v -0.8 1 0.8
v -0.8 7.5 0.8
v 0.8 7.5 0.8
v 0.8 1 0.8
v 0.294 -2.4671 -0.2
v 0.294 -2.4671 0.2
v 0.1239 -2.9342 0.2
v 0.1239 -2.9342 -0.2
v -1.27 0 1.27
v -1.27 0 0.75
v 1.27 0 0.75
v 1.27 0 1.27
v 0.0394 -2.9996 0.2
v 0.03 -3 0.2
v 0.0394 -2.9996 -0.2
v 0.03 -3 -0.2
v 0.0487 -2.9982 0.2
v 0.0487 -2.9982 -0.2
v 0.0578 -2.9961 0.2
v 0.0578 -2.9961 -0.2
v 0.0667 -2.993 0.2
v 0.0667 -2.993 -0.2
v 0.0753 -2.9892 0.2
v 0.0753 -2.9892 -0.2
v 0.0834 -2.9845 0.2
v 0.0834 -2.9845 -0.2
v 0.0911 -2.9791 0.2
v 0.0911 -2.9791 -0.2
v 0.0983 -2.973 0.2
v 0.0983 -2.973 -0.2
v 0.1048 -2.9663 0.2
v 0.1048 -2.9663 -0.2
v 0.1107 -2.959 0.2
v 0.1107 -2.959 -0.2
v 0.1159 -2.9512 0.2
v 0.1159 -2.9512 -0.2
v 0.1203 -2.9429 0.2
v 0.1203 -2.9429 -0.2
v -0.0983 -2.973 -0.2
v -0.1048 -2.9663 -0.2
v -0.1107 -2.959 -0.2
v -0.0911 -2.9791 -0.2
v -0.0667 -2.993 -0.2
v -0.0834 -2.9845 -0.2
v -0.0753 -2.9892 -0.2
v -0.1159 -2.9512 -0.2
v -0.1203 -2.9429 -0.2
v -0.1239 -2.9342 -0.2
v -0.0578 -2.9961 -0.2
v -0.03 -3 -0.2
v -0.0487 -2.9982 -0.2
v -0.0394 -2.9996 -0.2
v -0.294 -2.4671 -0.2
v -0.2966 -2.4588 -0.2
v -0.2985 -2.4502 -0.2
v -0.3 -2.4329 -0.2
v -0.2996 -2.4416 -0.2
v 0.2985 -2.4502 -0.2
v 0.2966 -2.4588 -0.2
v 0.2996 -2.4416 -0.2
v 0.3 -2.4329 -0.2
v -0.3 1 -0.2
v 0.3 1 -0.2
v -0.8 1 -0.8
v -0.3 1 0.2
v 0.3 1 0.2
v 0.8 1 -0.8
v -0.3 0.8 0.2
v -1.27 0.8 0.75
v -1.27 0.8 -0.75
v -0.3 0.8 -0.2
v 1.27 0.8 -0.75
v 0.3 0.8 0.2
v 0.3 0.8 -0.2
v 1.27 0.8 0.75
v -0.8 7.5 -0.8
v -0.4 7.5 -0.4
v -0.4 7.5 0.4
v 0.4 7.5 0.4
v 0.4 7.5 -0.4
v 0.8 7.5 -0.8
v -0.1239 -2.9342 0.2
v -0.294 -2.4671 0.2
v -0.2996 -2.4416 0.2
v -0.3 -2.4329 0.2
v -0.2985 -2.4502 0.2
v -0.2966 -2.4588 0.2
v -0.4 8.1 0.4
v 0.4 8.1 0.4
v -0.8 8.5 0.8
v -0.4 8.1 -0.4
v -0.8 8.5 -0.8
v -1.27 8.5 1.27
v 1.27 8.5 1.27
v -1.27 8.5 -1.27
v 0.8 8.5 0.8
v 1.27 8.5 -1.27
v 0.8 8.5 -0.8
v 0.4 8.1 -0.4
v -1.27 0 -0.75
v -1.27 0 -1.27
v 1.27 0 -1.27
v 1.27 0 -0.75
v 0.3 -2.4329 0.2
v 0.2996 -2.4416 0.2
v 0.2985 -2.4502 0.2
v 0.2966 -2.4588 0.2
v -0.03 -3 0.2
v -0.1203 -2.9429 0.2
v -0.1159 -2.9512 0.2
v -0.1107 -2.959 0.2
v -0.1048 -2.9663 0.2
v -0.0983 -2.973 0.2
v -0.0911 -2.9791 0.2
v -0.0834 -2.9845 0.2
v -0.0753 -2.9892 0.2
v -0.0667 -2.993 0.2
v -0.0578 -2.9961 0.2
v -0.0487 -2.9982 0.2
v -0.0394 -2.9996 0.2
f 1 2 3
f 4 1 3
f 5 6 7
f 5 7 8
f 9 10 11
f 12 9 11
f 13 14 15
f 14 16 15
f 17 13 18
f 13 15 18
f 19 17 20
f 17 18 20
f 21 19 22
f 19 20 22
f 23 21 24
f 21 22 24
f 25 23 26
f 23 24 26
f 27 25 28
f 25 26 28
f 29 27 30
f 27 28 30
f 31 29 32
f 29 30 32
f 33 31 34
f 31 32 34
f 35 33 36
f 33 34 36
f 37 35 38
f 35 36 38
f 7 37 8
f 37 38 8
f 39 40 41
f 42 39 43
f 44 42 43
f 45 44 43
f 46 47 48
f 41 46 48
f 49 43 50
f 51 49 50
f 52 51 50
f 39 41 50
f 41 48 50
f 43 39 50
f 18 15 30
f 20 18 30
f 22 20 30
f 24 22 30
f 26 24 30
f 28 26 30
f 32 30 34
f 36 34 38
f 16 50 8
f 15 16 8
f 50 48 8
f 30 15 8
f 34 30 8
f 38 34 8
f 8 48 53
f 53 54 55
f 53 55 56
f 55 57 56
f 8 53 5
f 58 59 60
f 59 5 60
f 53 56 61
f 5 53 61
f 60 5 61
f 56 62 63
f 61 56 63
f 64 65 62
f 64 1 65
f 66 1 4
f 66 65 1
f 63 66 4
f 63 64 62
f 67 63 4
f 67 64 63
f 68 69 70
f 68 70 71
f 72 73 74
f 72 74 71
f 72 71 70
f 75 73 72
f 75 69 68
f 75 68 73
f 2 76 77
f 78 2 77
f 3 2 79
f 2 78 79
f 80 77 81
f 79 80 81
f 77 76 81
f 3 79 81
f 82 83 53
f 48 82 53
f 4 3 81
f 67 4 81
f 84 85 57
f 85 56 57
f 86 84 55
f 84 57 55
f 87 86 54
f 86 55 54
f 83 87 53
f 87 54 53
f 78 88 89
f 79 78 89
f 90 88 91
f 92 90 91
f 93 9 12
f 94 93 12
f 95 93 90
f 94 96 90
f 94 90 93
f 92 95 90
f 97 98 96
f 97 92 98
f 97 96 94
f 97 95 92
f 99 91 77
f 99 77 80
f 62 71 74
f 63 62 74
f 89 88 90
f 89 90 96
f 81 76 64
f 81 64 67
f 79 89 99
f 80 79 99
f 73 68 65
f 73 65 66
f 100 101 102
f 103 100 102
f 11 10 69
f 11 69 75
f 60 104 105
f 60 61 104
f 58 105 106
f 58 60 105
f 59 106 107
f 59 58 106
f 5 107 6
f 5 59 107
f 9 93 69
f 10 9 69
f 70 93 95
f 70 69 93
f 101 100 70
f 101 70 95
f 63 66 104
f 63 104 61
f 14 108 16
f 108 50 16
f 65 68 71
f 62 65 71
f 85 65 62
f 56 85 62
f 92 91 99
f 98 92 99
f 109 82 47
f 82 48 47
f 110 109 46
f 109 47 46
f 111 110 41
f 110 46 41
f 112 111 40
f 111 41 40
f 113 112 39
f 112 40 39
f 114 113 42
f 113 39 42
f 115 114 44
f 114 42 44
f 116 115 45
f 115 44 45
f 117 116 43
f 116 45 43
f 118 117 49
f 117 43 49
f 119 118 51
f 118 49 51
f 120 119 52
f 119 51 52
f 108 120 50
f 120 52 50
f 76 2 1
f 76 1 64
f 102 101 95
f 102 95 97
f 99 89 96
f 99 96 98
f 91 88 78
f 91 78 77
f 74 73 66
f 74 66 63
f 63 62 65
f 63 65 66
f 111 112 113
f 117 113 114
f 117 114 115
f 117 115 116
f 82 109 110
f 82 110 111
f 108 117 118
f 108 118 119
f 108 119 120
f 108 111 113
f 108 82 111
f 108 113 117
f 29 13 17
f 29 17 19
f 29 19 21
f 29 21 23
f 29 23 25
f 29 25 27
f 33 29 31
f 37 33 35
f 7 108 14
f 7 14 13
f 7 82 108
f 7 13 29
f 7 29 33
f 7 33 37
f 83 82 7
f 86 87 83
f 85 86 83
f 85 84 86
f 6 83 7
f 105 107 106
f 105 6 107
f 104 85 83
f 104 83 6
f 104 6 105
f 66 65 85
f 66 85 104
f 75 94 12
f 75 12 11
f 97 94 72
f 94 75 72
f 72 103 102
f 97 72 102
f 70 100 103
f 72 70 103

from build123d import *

# Parameters (mm, degrees)
SKETCH3_W           = 2.54
SKETCH3_H           = 2.54
SKETCH3_W_2         = 0.6
SKETCH3_H_2         = 0.4
BOSS_EXTRUDE1_DEPTH = 8.5
SKETCH4_W           = 0.8
SKETCH4_H           = 0.8
CUT_EXTRUDE1_DEPTH  = 7.5
CHAMFER1_SIZE       = 0.4
CUT_EXTRUDE3_START  = -1
SKETCH5_W           = 1.6
SKETCH5_H           = 1.6
CUT_EXTRUDE3_DEPTH  = 6.5
SKETCH6_W           = 2.54
SKETCH6_H           = 1.5
CUT_EXTRUDE4_DEPTH  = 0.8
BOSS_EXTRUDE2_START = 1
SKETCH7_W           = 0.6
SKETCH7_H           = 0.4
BOSS_EXTRUDE2_DEPTH = 4
CHAMFER2_SIZE       = 0.2
CHAMFER2_SIZE2      = 0.549495484
FILLET1_R           = 0.1


with BuildPart() as part:
    # Sketch3 → Boss-Extrude1 (new body)
    with BuildSketch(Plane(origin=(0, 0, 0), x_dir=(1, 0, 0), z_dir=(0, 1, 0))):
        Rectangle(SKETCH3_W, SKETCH3_H)
        Rectangle(SKETCH3_W_2, SKETCH3_H_2, mode=Mode.SUBTRACT)
    extrude(amount=BOSS_EXTRUDE1_DEPTH)

    # Sketch4 → Cut-Extrude1 (cut)
    with BuildSketch(Plane(origin=(0, 8.5, 0), x_dir=(1, 0, 0), z_dir=(0, 1, 0))):
        Rectangle(SKETCH4_W, SKETCH4_H)
    extrude(amount=-CUT_EXTRUDE1_DEPTH, mode=Mode.SUBTRACT)

    # Chamfer1
    chamfer1_edges = [part.edges().sort_by_distance(p)[0] for p in [
        (0.4, 8.5, 0),
        (0, 8.5, -0.4),
        (-0.4, 8.5, 0),
        (0, 8.5, 0.4),
    ]]
    chamfer(chamfer1_edges, length=CHAMFER1_SIZE)

    # Sketch5 → Cut-Extrude3 (cut)
    with BuildSketch(Plane(origin=(0, 8.5, 0), x_dir=(1, 0, 0), z_dir=(0, 1, 0)).offset(CUT_EXTRUDE3_START)):
        Rectangle(SKETCH5_W, SKETCH5_H)
    extrude(amount=-CUT_EXTRUDE3_DEPTH, mode=Mode.SUBTRACT)

    # Sketch6 → Cut-Extrude4 (cut)
    with BuildSketch(Plane.XZ):
        Rectangle(SKETCH6_W, SKETCH6_H)
    extrude(amount=-CUT_EXTRUDE4_DEPTH, mode=Mode.SUBTRACT)


with BuildPart() as body_2:
    # Sketch7 → Boss-Extrude2 (new body)
    with BuildSketch(Plane(origin=(0, 0, 0), x_dir=(1, 0, 0), z_dir=(0, 1, 0)).offset(BOSS_EXTRUDE2_START)):
        Rectangle(SKETCH7_W, SKETCH7_H)
    extrude(amount=-BOSS_EXTRUDE2_DEPTH)

    # Chamfer2
    chamfer2_edges = [body_2.edges().sort_by_distance(p)[0] for p in [
        (-0.3, -3, 0),
        (0.3, -3, 0),
    ]]
    chamfer2_side = [body_2.faces().sort_by_distance(p)[0] for p in [
        (0, -3, 0),
    ]]
    chamfer(chamfer2_edges, length=CHAMFER2_SIZE, length2=CHAMFER2_SIZE2, reference=chamfer2_side[0])

    # Fillet1
    fillet1_edges = [body_2.edges().sort_by_distance(p)[0] for p in [
        (-0.3, -2.450504516, 0),
        (0.1, -3, 0),
        (-0.1, -3, 0),
        (0.3, -2.450504516, 0),
    ]]
    fillet(fillet1_edges, radius=FILLET1_R)


solid = Compound([part.part, body_2.part])
